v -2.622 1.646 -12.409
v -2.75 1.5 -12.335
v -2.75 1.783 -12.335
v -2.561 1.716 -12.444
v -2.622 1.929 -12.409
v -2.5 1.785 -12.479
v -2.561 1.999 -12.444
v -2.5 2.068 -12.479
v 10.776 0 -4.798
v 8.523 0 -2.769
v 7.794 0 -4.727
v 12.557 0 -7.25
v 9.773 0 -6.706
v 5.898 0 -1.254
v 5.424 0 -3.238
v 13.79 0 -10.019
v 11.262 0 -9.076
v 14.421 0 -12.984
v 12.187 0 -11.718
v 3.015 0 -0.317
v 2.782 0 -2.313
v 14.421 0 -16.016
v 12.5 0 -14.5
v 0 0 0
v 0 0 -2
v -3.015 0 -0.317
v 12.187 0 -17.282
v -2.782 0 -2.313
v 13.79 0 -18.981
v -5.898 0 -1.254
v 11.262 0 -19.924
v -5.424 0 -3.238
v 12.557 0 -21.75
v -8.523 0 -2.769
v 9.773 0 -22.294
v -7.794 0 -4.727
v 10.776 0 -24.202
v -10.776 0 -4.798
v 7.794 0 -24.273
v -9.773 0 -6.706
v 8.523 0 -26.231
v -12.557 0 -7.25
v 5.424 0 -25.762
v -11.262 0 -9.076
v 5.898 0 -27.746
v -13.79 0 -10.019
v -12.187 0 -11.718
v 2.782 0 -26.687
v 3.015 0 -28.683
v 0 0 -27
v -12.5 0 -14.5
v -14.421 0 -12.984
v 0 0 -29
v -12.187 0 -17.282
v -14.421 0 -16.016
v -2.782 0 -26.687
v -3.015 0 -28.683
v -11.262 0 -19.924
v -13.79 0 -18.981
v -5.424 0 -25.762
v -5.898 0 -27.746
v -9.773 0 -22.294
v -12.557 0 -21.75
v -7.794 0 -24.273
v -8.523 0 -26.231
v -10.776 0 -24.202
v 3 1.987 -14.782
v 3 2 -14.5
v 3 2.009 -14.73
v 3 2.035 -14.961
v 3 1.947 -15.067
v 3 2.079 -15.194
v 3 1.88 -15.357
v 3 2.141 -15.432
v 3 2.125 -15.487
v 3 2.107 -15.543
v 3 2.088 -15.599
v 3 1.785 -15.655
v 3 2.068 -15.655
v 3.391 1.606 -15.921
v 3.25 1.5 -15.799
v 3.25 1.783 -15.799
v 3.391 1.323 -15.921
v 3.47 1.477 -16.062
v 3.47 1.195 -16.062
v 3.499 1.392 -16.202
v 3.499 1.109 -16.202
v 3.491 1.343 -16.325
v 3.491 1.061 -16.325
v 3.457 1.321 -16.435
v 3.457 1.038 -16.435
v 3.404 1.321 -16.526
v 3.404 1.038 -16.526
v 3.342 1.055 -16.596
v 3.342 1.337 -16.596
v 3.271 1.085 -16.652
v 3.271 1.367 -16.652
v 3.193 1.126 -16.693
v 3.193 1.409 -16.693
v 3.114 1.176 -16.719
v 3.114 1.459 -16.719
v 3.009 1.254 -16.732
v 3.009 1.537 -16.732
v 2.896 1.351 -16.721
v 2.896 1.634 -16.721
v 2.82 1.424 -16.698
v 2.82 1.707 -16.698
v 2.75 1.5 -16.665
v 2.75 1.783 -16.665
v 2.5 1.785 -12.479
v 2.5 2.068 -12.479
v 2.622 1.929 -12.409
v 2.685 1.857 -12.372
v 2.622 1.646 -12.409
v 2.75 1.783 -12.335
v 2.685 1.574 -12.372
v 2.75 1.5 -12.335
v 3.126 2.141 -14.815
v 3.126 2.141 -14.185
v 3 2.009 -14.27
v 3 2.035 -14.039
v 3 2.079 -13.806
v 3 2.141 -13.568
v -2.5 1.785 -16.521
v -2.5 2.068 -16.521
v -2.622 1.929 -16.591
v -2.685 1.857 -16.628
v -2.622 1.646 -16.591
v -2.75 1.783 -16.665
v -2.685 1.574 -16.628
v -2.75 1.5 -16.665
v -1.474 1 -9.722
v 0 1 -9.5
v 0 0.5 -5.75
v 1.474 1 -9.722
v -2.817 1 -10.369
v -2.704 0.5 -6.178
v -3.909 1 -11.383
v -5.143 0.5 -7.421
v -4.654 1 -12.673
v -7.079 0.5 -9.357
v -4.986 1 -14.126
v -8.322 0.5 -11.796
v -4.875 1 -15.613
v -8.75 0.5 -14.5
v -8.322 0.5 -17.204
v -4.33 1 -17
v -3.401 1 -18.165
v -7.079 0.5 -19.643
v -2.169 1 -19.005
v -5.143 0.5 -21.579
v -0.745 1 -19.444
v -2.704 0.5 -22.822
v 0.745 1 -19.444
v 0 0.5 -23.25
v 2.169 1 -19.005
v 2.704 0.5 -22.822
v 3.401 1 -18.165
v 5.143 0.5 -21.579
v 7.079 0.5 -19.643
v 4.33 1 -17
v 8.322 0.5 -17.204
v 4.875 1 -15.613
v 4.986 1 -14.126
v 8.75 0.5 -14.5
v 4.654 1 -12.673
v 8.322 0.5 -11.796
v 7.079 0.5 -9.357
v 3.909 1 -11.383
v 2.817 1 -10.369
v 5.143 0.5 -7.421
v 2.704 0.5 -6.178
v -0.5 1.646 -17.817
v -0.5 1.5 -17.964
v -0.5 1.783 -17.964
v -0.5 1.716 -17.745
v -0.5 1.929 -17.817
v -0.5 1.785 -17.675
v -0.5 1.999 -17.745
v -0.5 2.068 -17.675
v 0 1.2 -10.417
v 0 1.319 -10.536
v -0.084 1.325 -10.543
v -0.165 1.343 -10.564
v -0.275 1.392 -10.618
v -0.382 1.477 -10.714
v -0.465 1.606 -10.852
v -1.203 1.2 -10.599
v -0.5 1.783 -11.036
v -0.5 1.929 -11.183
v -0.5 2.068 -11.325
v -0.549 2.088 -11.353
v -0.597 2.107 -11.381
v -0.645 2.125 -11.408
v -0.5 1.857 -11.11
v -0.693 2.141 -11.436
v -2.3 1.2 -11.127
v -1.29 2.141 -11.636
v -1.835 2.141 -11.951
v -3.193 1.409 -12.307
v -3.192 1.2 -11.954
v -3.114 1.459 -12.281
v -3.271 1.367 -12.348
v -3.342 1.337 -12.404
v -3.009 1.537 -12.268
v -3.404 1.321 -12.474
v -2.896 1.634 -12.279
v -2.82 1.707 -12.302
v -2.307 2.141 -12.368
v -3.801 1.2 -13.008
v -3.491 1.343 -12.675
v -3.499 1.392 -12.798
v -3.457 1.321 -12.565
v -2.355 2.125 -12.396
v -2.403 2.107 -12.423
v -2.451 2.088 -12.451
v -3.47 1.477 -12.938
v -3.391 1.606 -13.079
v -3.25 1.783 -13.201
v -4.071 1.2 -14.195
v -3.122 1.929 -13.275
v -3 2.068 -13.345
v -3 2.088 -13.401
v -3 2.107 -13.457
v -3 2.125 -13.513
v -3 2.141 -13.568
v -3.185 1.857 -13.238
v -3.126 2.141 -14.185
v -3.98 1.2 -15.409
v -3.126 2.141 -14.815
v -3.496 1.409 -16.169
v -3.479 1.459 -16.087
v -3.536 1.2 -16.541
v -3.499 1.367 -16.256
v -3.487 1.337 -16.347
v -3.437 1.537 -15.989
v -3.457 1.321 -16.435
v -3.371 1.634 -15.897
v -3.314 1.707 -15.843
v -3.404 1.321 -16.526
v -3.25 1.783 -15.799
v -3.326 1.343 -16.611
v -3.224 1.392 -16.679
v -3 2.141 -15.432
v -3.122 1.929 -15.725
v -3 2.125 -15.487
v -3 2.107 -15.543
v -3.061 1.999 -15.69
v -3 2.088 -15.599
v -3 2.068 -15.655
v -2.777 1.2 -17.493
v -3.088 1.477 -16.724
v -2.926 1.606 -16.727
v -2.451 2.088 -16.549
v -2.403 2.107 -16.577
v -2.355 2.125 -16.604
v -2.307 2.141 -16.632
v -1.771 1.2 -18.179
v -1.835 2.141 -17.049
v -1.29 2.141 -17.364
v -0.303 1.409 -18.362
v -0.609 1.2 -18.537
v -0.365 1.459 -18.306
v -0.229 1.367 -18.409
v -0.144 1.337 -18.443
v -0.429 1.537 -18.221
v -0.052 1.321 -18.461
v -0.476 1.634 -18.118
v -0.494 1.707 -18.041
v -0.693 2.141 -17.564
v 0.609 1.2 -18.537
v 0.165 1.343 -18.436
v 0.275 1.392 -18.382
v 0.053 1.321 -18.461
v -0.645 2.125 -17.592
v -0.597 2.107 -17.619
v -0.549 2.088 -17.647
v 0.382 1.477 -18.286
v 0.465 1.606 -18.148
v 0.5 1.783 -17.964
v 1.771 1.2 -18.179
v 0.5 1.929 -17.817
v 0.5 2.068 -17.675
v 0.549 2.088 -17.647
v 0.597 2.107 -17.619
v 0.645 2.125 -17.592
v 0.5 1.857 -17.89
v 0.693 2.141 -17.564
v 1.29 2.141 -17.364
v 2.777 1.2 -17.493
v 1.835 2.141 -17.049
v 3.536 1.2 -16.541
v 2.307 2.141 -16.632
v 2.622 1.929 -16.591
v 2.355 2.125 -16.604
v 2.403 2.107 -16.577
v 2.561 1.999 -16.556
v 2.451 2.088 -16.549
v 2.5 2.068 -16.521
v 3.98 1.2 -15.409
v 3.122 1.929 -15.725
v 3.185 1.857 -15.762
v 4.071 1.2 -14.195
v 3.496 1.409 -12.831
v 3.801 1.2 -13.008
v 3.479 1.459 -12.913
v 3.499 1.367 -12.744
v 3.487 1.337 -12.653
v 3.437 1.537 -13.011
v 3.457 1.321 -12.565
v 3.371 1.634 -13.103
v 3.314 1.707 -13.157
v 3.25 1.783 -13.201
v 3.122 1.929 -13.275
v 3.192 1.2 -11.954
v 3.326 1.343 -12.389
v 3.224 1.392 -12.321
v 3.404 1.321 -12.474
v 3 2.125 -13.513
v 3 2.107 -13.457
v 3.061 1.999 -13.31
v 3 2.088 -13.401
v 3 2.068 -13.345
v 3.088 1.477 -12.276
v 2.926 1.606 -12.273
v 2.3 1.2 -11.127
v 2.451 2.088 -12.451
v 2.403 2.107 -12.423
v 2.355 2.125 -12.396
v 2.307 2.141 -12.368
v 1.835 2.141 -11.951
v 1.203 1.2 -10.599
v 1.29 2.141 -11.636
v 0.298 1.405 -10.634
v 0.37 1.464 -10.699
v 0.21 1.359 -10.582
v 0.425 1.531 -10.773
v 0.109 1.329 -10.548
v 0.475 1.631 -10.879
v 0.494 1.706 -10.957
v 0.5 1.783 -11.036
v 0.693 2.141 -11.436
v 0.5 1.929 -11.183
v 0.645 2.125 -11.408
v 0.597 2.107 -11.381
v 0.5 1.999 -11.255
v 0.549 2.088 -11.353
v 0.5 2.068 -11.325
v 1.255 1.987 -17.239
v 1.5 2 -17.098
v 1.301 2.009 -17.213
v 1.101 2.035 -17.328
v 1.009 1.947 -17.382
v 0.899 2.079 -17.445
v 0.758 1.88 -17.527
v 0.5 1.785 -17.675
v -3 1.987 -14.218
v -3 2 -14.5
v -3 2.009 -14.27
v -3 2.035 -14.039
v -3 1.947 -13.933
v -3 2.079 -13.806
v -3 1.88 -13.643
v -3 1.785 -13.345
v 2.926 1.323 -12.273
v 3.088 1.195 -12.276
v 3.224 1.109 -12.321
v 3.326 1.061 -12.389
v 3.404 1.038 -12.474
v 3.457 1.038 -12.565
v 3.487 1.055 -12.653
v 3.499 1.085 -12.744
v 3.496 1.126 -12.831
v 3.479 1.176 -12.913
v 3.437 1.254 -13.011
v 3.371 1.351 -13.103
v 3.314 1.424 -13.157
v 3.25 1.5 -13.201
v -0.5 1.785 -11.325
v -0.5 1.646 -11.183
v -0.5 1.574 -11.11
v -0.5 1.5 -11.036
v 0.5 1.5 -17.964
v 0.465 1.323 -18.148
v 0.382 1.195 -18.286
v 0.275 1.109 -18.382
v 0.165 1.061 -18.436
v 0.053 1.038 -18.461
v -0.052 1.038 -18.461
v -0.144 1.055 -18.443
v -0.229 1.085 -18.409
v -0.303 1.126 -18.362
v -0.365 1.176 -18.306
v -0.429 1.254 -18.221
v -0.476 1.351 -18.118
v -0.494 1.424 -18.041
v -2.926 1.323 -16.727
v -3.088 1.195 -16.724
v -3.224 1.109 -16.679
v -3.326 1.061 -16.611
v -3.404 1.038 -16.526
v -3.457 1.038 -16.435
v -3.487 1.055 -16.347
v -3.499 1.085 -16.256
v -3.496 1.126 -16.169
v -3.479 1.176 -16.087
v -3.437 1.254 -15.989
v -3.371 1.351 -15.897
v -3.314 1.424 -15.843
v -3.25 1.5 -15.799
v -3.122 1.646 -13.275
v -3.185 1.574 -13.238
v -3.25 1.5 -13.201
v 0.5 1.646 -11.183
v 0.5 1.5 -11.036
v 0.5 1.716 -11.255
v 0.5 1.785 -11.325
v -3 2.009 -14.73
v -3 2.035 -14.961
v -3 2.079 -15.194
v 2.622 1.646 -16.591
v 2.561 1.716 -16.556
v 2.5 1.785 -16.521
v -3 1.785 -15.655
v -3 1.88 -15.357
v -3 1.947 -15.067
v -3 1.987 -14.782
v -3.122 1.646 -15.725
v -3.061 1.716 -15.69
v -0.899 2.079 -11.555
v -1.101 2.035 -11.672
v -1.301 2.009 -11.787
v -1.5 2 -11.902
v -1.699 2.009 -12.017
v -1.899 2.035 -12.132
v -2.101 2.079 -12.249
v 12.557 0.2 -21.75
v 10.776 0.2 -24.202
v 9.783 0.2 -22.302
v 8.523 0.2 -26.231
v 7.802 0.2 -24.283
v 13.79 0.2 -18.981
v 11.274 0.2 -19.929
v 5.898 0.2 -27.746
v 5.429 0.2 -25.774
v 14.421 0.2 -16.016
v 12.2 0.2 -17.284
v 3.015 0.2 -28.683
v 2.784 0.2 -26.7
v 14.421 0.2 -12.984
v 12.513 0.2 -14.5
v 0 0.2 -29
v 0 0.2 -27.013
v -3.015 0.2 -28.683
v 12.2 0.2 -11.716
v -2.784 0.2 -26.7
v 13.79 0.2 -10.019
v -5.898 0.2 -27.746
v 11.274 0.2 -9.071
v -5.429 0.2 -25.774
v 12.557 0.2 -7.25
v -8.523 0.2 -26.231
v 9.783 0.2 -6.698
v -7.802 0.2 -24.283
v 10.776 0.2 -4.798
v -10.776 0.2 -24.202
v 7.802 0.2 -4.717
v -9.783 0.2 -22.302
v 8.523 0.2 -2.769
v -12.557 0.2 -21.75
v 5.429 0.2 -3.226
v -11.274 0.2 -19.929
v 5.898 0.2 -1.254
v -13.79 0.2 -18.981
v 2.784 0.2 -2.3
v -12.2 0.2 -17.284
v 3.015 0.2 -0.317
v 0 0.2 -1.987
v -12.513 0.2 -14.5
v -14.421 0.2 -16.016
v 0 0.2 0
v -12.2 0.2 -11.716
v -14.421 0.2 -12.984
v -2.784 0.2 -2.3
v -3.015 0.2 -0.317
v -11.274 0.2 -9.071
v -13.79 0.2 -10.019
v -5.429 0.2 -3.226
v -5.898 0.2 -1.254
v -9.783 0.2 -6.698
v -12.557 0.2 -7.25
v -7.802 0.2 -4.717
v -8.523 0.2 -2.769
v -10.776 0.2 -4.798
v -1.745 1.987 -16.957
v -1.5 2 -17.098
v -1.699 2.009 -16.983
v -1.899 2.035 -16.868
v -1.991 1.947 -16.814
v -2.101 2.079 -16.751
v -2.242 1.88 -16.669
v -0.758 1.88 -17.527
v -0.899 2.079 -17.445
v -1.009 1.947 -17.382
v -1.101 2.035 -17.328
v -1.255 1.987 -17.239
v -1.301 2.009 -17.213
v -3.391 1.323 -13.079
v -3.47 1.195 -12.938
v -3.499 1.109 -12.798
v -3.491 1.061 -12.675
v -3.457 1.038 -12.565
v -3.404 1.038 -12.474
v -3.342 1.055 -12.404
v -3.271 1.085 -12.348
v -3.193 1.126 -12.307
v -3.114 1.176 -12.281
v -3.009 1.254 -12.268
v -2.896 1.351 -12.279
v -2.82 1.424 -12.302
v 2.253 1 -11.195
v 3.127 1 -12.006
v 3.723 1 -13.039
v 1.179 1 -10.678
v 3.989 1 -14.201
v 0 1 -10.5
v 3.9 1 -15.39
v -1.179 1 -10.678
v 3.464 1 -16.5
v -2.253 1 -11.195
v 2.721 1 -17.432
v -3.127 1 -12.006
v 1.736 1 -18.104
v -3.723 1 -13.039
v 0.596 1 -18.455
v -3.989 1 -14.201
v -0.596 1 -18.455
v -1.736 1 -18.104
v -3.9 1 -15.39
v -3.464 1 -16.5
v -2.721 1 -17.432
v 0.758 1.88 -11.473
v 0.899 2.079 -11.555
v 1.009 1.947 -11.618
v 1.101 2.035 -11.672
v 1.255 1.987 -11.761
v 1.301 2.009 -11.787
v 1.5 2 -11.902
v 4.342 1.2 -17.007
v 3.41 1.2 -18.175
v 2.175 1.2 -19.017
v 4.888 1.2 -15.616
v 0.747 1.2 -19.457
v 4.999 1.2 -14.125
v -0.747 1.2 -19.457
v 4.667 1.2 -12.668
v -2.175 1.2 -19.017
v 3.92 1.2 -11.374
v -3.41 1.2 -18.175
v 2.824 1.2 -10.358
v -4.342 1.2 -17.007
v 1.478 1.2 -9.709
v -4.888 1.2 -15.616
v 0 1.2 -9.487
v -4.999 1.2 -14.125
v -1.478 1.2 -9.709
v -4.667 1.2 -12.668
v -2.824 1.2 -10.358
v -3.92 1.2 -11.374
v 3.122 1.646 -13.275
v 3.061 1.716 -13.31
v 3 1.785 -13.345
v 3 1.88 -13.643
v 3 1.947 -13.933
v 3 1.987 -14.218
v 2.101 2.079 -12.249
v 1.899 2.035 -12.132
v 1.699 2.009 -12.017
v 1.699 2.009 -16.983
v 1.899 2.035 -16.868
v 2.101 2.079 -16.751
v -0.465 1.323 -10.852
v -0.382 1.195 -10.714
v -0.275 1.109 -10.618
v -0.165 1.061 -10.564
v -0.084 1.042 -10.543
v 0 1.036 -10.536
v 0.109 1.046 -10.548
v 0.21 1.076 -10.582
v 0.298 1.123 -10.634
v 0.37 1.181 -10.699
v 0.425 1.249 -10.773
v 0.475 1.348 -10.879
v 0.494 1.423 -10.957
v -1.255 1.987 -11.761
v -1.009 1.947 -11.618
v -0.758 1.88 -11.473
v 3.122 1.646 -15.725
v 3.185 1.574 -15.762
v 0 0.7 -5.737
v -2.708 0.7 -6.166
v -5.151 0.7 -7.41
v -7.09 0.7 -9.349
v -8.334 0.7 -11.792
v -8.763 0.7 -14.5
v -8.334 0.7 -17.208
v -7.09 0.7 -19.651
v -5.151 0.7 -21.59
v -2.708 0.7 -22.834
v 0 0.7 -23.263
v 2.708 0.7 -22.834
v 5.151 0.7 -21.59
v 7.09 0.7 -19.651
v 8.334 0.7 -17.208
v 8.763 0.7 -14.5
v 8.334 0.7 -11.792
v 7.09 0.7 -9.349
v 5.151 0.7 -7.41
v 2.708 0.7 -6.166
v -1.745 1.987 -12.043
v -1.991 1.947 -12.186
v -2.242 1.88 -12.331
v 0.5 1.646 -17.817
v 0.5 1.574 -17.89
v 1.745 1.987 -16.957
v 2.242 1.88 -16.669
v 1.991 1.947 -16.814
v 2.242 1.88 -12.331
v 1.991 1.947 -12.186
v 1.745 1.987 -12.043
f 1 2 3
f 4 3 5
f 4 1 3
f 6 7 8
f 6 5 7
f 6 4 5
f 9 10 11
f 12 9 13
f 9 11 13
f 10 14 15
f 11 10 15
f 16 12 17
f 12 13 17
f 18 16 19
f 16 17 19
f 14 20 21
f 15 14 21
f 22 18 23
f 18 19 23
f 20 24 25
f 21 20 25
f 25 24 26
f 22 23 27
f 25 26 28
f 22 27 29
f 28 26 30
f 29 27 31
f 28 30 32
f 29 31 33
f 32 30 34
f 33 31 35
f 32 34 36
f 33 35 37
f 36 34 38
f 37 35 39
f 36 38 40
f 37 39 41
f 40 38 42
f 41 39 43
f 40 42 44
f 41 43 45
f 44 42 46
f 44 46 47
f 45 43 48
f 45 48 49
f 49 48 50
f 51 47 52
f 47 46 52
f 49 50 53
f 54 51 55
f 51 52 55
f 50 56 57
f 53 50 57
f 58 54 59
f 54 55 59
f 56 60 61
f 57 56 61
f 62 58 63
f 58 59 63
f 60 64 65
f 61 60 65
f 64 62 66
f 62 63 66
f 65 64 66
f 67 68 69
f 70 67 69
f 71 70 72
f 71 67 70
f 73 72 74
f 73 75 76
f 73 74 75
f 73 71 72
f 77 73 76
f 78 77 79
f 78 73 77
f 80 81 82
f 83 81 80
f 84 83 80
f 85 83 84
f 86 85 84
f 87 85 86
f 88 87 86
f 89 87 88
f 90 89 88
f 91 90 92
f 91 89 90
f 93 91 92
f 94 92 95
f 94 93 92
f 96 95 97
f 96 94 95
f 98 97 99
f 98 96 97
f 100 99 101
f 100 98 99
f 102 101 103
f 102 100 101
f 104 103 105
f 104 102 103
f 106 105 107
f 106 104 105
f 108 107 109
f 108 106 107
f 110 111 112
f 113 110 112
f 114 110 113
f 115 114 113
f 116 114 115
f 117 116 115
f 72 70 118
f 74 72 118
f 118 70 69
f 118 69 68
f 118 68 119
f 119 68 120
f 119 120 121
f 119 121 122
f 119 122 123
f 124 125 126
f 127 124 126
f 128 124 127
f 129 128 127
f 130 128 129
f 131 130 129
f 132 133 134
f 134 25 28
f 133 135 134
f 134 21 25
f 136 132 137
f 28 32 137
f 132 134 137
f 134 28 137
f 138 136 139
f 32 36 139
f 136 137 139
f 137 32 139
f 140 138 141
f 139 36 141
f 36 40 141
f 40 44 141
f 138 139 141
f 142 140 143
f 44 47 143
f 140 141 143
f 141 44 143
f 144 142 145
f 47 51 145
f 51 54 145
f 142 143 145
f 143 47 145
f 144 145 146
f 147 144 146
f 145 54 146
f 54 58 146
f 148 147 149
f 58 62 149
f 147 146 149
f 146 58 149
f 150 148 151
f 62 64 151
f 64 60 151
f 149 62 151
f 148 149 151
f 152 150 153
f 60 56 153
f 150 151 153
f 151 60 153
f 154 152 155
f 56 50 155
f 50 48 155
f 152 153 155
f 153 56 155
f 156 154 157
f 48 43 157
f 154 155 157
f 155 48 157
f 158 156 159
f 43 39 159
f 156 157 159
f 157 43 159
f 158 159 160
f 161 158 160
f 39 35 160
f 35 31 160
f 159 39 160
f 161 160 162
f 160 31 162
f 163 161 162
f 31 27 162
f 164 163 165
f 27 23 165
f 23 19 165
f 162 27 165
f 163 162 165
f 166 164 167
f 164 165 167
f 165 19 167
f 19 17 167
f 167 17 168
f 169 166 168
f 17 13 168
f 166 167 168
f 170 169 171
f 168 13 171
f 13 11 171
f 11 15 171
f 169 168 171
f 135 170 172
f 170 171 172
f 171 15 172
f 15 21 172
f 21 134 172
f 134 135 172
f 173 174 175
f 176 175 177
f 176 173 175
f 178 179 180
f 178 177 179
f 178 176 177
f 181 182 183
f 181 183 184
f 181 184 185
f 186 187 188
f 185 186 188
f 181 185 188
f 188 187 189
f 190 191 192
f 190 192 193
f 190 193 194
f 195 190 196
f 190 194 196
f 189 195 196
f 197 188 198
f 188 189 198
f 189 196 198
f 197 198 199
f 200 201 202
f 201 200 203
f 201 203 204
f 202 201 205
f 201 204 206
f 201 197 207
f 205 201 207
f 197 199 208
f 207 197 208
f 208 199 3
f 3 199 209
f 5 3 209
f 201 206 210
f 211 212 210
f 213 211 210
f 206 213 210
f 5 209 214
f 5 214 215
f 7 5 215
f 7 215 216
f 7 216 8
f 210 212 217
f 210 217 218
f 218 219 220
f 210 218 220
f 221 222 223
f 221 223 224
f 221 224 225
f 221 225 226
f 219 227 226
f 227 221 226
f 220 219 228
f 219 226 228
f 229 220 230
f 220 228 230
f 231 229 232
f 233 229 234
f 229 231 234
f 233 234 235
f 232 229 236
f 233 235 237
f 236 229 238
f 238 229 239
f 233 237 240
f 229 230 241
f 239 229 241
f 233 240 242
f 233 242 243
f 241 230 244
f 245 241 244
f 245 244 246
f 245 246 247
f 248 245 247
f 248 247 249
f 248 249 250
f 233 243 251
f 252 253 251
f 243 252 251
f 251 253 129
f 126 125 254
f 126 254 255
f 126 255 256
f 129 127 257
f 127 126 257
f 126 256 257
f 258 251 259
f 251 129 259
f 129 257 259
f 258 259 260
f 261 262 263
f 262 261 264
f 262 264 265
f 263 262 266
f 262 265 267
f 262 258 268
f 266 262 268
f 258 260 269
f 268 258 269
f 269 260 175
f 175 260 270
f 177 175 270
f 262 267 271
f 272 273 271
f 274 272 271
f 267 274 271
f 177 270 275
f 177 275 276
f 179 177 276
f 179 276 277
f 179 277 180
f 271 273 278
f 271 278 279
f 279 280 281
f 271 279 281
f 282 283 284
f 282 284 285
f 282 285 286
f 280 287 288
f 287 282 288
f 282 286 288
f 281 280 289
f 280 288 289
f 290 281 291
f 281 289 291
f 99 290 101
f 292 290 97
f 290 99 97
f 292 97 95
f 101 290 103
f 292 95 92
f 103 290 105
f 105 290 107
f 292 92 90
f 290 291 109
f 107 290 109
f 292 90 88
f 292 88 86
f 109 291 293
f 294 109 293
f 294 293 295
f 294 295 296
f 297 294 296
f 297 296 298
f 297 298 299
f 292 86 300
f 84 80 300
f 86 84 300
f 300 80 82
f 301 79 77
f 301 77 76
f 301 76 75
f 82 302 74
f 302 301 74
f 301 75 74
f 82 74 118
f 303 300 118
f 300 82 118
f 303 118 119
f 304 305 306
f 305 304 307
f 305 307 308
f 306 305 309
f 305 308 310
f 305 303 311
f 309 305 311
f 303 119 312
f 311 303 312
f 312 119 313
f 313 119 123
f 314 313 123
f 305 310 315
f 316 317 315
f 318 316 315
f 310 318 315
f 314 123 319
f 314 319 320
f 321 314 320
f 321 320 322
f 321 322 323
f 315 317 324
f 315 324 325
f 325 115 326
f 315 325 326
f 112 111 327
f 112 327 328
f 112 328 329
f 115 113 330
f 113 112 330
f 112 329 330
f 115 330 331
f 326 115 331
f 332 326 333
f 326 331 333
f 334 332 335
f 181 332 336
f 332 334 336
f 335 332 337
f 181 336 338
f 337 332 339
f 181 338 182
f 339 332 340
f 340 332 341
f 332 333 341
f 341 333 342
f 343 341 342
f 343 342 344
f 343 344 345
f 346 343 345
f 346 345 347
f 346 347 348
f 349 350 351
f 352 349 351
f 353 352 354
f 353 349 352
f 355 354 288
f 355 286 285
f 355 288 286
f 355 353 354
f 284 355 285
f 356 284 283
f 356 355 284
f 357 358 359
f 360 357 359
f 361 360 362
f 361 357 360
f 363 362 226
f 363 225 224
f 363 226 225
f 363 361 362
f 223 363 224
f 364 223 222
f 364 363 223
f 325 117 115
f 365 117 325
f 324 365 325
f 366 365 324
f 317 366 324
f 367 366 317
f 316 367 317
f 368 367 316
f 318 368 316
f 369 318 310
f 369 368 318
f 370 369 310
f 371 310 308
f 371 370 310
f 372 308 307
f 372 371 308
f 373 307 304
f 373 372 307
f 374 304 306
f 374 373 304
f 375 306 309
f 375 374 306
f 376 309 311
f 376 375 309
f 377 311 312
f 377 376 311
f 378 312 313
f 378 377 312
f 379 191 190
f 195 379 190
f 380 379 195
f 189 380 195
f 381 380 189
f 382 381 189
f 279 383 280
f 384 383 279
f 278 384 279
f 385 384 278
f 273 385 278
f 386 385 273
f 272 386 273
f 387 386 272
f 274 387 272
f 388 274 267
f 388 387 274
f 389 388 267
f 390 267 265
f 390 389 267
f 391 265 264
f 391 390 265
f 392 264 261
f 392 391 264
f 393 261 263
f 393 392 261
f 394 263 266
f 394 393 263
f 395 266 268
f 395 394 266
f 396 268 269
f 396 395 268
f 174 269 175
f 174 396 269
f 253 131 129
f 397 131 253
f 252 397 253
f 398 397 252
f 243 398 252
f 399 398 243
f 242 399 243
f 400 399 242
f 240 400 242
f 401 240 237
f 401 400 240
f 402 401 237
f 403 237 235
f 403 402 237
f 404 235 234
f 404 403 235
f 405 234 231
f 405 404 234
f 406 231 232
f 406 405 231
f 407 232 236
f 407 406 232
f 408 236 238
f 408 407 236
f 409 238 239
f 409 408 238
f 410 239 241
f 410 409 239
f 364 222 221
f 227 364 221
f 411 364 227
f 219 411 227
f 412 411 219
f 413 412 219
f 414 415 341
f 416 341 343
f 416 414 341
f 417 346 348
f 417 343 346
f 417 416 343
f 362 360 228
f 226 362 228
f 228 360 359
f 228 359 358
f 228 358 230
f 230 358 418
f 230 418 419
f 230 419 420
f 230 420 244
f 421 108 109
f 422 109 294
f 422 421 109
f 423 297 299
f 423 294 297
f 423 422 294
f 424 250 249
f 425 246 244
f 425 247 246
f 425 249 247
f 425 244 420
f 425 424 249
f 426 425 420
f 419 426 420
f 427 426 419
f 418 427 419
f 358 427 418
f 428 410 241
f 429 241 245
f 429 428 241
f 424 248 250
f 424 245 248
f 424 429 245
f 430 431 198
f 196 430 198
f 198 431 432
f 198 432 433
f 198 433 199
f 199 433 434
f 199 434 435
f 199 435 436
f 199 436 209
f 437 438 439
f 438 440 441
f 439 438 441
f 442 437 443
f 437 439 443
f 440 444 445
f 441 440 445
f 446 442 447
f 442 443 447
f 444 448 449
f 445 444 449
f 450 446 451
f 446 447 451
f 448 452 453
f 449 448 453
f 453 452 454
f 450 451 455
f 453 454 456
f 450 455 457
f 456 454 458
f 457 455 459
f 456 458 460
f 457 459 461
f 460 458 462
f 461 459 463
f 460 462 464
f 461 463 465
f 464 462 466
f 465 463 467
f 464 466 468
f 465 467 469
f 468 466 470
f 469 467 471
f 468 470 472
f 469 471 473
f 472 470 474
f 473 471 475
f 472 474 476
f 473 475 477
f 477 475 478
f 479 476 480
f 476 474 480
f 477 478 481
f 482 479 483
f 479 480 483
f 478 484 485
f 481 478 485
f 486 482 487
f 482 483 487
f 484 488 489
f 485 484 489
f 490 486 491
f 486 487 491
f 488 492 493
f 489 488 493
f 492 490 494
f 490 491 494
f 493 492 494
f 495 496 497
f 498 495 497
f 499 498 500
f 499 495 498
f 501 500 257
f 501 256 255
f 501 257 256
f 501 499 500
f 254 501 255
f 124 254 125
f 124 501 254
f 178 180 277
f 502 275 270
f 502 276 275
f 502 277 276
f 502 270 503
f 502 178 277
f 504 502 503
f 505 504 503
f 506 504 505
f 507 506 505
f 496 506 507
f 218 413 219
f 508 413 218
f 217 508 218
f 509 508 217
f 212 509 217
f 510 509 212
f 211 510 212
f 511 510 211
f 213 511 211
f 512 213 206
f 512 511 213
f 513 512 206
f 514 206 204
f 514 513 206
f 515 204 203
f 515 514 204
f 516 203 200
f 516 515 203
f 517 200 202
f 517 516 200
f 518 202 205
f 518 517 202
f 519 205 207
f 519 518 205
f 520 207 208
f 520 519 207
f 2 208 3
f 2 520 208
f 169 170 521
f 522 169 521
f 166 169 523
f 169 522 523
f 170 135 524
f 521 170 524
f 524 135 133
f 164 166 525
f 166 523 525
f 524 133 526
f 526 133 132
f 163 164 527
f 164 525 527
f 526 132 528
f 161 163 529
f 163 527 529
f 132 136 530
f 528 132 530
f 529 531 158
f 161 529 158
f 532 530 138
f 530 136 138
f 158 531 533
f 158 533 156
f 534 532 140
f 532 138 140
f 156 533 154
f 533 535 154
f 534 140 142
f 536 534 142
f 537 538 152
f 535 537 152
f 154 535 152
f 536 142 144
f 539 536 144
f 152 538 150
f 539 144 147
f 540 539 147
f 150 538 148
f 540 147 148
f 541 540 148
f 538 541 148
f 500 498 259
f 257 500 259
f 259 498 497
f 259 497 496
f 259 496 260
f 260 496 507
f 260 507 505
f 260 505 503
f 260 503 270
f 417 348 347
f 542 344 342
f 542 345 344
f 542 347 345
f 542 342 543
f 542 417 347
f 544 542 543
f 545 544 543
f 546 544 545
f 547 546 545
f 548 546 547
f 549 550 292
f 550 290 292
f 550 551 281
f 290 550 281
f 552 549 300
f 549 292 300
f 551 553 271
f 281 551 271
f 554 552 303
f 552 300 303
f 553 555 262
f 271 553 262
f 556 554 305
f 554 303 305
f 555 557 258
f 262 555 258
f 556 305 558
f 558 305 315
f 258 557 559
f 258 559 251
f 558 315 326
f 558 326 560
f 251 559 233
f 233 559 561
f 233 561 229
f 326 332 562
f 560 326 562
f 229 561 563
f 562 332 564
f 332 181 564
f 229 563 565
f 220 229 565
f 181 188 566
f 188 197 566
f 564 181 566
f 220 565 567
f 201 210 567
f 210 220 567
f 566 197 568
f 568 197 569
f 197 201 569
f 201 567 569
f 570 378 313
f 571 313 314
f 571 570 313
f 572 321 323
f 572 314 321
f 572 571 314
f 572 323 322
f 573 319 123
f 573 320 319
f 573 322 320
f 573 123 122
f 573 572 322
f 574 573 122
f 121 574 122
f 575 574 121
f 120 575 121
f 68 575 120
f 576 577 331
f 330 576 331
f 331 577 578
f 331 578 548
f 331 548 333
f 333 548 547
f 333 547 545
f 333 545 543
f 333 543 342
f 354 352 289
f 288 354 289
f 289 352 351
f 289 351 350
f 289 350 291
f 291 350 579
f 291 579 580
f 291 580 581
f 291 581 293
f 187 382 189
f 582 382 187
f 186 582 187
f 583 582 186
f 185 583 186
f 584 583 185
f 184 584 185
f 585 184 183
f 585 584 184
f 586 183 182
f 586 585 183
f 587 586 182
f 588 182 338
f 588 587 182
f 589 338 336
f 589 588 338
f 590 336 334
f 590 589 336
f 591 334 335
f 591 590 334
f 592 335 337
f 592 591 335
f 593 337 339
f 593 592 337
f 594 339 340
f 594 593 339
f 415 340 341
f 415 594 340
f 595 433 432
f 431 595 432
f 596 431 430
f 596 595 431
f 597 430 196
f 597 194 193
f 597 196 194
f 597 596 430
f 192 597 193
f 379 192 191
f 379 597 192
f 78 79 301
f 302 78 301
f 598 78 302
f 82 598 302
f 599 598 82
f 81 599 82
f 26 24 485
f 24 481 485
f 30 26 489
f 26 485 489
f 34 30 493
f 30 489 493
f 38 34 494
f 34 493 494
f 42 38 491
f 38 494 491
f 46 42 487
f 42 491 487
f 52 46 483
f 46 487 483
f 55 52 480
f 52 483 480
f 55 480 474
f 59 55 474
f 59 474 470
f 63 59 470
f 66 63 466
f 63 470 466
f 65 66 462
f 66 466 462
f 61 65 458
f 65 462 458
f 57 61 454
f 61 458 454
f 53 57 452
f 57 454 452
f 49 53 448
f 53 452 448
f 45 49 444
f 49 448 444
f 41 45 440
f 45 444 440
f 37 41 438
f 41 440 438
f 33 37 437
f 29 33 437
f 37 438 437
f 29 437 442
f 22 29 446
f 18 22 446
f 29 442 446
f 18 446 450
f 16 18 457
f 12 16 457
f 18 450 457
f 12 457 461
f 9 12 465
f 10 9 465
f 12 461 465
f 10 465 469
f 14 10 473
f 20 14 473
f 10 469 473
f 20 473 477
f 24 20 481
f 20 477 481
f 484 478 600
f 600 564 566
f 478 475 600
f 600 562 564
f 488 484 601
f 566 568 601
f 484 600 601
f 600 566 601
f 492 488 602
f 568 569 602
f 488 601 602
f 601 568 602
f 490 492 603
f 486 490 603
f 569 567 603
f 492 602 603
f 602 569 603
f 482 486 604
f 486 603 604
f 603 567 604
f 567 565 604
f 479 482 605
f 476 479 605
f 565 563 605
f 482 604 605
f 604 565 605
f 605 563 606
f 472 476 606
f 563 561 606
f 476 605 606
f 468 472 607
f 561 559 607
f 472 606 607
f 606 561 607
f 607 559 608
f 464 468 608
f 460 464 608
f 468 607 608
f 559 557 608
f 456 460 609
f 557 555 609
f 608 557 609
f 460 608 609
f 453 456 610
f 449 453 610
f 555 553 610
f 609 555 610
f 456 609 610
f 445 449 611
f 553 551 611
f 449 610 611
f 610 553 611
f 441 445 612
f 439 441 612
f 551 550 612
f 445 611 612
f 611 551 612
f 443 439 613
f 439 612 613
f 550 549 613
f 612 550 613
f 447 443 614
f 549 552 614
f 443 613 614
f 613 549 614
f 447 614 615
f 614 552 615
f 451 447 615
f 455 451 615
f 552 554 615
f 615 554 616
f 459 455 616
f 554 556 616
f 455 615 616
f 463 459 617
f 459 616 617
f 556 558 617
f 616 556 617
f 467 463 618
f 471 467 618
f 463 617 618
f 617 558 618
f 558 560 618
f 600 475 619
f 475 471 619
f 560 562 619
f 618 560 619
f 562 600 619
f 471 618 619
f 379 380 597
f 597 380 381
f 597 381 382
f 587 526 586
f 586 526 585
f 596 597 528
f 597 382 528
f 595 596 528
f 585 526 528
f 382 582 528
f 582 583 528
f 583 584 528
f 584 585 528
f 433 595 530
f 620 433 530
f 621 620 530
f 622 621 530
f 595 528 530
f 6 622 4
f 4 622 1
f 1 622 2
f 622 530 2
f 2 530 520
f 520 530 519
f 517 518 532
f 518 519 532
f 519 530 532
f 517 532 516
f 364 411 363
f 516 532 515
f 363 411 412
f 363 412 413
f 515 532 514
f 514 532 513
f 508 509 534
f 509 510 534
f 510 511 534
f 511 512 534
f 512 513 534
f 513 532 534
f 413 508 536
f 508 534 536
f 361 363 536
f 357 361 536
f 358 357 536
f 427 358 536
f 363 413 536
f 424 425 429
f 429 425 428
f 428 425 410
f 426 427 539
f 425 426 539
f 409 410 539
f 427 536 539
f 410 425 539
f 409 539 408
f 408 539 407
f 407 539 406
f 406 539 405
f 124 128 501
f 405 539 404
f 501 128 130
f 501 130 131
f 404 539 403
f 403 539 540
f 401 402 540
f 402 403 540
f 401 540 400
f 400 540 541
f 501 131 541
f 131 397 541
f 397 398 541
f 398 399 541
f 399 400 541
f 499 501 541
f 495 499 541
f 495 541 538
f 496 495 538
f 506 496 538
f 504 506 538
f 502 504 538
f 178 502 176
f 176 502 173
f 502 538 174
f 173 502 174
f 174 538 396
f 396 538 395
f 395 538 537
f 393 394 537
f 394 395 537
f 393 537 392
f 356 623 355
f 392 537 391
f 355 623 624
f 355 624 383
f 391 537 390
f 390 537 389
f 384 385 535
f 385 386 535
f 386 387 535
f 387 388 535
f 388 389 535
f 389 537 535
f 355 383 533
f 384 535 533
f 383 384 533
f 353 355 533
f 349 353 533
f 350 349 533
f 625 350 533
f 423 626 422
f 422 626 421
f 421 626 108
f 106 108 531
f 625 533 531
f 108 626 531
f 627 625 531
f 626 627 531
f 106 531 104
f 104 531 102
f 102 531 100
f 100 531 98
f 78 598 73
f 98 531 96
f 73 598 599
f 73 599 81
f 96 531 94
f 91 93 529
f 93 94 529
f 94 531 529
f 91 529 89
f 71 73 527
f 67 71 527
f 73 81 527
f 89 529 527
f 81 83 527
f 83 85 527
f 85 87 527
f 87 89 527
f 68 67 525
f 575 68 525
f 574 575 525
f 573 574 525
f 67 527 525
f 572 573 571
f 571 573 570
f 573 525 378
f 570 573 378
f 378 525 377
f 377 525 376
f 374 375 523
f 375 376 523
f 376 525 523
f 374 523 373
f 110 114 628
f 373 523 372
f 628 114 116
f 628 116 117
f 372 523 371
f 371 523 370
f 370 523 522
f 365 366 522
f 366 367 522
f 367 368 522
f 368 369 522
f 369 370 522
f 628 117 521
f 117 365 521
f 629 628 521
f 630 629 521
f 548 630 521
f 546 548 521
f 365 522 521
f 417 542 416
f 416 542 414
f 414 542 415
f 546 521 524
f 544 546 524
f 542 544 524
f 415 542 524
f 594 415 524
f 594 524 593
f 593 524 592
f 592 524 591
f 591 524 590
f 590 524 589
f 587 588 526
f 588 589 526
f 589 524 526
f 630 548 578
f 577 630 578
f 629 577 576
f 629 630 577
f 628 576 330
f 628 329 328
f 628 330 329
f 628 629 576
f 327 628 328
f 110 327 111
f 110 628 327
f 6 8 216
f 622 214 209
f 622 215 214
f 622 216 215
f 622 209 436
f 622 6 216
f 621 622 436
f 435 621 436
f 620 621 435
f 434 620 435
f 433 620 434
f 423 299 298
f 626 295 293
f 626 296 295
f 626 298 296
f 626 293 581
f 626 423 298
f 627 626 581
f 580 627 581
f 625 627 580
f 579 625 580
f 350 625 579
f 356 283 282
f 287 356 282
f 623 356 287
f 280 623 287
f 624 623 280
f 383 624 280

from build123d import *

# Parameters (mm, degrees)
CUT_EXTRUDE2_DEPTH = 10


with BuildPart() as part:
    # Sketch1 → Revolve1 (revolve)
    with BuildSketch(Plane(origin=(0, 0, 0), x_dir=(0, 0, -1), z_dir=(1, 0, 0))):
        Polygon((0, 0), (0, 0.2), (1.986725405, 0.2), (9.486725405, 1.2), (10.417157288, 1.2), (11.358578644, 2.141421356), (11.5, 2), (10.5, 1), (9.5, 1), (2, 0), align=None)
    revolve(axis=Axis((0, 1.2, -14.5), (0, -1, 0)))

    # Sketch3 → Cut-Extrude2 (cut)
    with BuildSketch(Plane(origin=(0, 0, 0), x_dir=(1, 0, 0), z_dir=(0, 1, 0))):
        with BuildLine():
            Line((3.25, 13.200961894), (3, 13.345299462))
            Line((3, 13.345299462), (3, 15.654700538))
            Line((3, 15.654700538), (3.25, 15.799038106))
            ThreePointArc((3.25, 15.799038106), (3.433012702, 16.482050808), (2.75, 16.665063509))
            Line((2.75, 16.665063509), (2.5, 16.520725942))
            Line((2.5, 16.520725942), (0.5, 17.675426481))
            Line((0.5, 17.675426481), (0.5, 17.964101615))
            ThreePointArc((0.5, 17.964101615), (0, 18.464101615), (-0.5, 17.964101615))
            Line((-0.5, 17.964101615), (-0.5, 17.675426481))
            Line((-0.5, 17.675426481), (-2.5, 16.520725942))
            Line((-2.5, 16.520725942), (-2.75, 16.665063509))
            ThreePointArc((-2.75, 16.665063509), (-3.433012702, 16.482050808), (-3.25, 15.799038106))
            Line((-3.25, 15.799038106), (-3, 15.654700538))
            Line((-3, 15.654700538), (-3, 13.345299462))
            Line((-3, 13.345299462), (-3.25, 13.200961894))
            ThreePointArc((-3.25, 13.200961894), (-3.433012702, 12.517949192), (-2.75, 12.334936491))
            Line((-2.75, 12.334936491), (-2.5, 12.479274058))
            Line((-2.5, 12.479274058), (-0.5, 11.324573519))
            Line((-0.5, 11.324573519), (-0.5, 11.035898385))
            ThreePointArc((-0.5, 11.035898385), (0, 10.535898385), (0.5, 11.035898385))
            Line((0.5, 11.035898385), (0.5, 11.324573519))
            Line((0.5, 11.324573519), (2.5, 12.479274058))
            Line((2.5, 12.479274058), (2.75, 12.334936491))
            ThreePointArc((2.75, 12.334936491), (3.433012702, 12.517949192), (3.25, 13.200961894))
        make_face()
    extrude(amount=CUT_EXTRUDE2_DEPTH, mode=Mode.SUBTRACT)


solid = part.part
